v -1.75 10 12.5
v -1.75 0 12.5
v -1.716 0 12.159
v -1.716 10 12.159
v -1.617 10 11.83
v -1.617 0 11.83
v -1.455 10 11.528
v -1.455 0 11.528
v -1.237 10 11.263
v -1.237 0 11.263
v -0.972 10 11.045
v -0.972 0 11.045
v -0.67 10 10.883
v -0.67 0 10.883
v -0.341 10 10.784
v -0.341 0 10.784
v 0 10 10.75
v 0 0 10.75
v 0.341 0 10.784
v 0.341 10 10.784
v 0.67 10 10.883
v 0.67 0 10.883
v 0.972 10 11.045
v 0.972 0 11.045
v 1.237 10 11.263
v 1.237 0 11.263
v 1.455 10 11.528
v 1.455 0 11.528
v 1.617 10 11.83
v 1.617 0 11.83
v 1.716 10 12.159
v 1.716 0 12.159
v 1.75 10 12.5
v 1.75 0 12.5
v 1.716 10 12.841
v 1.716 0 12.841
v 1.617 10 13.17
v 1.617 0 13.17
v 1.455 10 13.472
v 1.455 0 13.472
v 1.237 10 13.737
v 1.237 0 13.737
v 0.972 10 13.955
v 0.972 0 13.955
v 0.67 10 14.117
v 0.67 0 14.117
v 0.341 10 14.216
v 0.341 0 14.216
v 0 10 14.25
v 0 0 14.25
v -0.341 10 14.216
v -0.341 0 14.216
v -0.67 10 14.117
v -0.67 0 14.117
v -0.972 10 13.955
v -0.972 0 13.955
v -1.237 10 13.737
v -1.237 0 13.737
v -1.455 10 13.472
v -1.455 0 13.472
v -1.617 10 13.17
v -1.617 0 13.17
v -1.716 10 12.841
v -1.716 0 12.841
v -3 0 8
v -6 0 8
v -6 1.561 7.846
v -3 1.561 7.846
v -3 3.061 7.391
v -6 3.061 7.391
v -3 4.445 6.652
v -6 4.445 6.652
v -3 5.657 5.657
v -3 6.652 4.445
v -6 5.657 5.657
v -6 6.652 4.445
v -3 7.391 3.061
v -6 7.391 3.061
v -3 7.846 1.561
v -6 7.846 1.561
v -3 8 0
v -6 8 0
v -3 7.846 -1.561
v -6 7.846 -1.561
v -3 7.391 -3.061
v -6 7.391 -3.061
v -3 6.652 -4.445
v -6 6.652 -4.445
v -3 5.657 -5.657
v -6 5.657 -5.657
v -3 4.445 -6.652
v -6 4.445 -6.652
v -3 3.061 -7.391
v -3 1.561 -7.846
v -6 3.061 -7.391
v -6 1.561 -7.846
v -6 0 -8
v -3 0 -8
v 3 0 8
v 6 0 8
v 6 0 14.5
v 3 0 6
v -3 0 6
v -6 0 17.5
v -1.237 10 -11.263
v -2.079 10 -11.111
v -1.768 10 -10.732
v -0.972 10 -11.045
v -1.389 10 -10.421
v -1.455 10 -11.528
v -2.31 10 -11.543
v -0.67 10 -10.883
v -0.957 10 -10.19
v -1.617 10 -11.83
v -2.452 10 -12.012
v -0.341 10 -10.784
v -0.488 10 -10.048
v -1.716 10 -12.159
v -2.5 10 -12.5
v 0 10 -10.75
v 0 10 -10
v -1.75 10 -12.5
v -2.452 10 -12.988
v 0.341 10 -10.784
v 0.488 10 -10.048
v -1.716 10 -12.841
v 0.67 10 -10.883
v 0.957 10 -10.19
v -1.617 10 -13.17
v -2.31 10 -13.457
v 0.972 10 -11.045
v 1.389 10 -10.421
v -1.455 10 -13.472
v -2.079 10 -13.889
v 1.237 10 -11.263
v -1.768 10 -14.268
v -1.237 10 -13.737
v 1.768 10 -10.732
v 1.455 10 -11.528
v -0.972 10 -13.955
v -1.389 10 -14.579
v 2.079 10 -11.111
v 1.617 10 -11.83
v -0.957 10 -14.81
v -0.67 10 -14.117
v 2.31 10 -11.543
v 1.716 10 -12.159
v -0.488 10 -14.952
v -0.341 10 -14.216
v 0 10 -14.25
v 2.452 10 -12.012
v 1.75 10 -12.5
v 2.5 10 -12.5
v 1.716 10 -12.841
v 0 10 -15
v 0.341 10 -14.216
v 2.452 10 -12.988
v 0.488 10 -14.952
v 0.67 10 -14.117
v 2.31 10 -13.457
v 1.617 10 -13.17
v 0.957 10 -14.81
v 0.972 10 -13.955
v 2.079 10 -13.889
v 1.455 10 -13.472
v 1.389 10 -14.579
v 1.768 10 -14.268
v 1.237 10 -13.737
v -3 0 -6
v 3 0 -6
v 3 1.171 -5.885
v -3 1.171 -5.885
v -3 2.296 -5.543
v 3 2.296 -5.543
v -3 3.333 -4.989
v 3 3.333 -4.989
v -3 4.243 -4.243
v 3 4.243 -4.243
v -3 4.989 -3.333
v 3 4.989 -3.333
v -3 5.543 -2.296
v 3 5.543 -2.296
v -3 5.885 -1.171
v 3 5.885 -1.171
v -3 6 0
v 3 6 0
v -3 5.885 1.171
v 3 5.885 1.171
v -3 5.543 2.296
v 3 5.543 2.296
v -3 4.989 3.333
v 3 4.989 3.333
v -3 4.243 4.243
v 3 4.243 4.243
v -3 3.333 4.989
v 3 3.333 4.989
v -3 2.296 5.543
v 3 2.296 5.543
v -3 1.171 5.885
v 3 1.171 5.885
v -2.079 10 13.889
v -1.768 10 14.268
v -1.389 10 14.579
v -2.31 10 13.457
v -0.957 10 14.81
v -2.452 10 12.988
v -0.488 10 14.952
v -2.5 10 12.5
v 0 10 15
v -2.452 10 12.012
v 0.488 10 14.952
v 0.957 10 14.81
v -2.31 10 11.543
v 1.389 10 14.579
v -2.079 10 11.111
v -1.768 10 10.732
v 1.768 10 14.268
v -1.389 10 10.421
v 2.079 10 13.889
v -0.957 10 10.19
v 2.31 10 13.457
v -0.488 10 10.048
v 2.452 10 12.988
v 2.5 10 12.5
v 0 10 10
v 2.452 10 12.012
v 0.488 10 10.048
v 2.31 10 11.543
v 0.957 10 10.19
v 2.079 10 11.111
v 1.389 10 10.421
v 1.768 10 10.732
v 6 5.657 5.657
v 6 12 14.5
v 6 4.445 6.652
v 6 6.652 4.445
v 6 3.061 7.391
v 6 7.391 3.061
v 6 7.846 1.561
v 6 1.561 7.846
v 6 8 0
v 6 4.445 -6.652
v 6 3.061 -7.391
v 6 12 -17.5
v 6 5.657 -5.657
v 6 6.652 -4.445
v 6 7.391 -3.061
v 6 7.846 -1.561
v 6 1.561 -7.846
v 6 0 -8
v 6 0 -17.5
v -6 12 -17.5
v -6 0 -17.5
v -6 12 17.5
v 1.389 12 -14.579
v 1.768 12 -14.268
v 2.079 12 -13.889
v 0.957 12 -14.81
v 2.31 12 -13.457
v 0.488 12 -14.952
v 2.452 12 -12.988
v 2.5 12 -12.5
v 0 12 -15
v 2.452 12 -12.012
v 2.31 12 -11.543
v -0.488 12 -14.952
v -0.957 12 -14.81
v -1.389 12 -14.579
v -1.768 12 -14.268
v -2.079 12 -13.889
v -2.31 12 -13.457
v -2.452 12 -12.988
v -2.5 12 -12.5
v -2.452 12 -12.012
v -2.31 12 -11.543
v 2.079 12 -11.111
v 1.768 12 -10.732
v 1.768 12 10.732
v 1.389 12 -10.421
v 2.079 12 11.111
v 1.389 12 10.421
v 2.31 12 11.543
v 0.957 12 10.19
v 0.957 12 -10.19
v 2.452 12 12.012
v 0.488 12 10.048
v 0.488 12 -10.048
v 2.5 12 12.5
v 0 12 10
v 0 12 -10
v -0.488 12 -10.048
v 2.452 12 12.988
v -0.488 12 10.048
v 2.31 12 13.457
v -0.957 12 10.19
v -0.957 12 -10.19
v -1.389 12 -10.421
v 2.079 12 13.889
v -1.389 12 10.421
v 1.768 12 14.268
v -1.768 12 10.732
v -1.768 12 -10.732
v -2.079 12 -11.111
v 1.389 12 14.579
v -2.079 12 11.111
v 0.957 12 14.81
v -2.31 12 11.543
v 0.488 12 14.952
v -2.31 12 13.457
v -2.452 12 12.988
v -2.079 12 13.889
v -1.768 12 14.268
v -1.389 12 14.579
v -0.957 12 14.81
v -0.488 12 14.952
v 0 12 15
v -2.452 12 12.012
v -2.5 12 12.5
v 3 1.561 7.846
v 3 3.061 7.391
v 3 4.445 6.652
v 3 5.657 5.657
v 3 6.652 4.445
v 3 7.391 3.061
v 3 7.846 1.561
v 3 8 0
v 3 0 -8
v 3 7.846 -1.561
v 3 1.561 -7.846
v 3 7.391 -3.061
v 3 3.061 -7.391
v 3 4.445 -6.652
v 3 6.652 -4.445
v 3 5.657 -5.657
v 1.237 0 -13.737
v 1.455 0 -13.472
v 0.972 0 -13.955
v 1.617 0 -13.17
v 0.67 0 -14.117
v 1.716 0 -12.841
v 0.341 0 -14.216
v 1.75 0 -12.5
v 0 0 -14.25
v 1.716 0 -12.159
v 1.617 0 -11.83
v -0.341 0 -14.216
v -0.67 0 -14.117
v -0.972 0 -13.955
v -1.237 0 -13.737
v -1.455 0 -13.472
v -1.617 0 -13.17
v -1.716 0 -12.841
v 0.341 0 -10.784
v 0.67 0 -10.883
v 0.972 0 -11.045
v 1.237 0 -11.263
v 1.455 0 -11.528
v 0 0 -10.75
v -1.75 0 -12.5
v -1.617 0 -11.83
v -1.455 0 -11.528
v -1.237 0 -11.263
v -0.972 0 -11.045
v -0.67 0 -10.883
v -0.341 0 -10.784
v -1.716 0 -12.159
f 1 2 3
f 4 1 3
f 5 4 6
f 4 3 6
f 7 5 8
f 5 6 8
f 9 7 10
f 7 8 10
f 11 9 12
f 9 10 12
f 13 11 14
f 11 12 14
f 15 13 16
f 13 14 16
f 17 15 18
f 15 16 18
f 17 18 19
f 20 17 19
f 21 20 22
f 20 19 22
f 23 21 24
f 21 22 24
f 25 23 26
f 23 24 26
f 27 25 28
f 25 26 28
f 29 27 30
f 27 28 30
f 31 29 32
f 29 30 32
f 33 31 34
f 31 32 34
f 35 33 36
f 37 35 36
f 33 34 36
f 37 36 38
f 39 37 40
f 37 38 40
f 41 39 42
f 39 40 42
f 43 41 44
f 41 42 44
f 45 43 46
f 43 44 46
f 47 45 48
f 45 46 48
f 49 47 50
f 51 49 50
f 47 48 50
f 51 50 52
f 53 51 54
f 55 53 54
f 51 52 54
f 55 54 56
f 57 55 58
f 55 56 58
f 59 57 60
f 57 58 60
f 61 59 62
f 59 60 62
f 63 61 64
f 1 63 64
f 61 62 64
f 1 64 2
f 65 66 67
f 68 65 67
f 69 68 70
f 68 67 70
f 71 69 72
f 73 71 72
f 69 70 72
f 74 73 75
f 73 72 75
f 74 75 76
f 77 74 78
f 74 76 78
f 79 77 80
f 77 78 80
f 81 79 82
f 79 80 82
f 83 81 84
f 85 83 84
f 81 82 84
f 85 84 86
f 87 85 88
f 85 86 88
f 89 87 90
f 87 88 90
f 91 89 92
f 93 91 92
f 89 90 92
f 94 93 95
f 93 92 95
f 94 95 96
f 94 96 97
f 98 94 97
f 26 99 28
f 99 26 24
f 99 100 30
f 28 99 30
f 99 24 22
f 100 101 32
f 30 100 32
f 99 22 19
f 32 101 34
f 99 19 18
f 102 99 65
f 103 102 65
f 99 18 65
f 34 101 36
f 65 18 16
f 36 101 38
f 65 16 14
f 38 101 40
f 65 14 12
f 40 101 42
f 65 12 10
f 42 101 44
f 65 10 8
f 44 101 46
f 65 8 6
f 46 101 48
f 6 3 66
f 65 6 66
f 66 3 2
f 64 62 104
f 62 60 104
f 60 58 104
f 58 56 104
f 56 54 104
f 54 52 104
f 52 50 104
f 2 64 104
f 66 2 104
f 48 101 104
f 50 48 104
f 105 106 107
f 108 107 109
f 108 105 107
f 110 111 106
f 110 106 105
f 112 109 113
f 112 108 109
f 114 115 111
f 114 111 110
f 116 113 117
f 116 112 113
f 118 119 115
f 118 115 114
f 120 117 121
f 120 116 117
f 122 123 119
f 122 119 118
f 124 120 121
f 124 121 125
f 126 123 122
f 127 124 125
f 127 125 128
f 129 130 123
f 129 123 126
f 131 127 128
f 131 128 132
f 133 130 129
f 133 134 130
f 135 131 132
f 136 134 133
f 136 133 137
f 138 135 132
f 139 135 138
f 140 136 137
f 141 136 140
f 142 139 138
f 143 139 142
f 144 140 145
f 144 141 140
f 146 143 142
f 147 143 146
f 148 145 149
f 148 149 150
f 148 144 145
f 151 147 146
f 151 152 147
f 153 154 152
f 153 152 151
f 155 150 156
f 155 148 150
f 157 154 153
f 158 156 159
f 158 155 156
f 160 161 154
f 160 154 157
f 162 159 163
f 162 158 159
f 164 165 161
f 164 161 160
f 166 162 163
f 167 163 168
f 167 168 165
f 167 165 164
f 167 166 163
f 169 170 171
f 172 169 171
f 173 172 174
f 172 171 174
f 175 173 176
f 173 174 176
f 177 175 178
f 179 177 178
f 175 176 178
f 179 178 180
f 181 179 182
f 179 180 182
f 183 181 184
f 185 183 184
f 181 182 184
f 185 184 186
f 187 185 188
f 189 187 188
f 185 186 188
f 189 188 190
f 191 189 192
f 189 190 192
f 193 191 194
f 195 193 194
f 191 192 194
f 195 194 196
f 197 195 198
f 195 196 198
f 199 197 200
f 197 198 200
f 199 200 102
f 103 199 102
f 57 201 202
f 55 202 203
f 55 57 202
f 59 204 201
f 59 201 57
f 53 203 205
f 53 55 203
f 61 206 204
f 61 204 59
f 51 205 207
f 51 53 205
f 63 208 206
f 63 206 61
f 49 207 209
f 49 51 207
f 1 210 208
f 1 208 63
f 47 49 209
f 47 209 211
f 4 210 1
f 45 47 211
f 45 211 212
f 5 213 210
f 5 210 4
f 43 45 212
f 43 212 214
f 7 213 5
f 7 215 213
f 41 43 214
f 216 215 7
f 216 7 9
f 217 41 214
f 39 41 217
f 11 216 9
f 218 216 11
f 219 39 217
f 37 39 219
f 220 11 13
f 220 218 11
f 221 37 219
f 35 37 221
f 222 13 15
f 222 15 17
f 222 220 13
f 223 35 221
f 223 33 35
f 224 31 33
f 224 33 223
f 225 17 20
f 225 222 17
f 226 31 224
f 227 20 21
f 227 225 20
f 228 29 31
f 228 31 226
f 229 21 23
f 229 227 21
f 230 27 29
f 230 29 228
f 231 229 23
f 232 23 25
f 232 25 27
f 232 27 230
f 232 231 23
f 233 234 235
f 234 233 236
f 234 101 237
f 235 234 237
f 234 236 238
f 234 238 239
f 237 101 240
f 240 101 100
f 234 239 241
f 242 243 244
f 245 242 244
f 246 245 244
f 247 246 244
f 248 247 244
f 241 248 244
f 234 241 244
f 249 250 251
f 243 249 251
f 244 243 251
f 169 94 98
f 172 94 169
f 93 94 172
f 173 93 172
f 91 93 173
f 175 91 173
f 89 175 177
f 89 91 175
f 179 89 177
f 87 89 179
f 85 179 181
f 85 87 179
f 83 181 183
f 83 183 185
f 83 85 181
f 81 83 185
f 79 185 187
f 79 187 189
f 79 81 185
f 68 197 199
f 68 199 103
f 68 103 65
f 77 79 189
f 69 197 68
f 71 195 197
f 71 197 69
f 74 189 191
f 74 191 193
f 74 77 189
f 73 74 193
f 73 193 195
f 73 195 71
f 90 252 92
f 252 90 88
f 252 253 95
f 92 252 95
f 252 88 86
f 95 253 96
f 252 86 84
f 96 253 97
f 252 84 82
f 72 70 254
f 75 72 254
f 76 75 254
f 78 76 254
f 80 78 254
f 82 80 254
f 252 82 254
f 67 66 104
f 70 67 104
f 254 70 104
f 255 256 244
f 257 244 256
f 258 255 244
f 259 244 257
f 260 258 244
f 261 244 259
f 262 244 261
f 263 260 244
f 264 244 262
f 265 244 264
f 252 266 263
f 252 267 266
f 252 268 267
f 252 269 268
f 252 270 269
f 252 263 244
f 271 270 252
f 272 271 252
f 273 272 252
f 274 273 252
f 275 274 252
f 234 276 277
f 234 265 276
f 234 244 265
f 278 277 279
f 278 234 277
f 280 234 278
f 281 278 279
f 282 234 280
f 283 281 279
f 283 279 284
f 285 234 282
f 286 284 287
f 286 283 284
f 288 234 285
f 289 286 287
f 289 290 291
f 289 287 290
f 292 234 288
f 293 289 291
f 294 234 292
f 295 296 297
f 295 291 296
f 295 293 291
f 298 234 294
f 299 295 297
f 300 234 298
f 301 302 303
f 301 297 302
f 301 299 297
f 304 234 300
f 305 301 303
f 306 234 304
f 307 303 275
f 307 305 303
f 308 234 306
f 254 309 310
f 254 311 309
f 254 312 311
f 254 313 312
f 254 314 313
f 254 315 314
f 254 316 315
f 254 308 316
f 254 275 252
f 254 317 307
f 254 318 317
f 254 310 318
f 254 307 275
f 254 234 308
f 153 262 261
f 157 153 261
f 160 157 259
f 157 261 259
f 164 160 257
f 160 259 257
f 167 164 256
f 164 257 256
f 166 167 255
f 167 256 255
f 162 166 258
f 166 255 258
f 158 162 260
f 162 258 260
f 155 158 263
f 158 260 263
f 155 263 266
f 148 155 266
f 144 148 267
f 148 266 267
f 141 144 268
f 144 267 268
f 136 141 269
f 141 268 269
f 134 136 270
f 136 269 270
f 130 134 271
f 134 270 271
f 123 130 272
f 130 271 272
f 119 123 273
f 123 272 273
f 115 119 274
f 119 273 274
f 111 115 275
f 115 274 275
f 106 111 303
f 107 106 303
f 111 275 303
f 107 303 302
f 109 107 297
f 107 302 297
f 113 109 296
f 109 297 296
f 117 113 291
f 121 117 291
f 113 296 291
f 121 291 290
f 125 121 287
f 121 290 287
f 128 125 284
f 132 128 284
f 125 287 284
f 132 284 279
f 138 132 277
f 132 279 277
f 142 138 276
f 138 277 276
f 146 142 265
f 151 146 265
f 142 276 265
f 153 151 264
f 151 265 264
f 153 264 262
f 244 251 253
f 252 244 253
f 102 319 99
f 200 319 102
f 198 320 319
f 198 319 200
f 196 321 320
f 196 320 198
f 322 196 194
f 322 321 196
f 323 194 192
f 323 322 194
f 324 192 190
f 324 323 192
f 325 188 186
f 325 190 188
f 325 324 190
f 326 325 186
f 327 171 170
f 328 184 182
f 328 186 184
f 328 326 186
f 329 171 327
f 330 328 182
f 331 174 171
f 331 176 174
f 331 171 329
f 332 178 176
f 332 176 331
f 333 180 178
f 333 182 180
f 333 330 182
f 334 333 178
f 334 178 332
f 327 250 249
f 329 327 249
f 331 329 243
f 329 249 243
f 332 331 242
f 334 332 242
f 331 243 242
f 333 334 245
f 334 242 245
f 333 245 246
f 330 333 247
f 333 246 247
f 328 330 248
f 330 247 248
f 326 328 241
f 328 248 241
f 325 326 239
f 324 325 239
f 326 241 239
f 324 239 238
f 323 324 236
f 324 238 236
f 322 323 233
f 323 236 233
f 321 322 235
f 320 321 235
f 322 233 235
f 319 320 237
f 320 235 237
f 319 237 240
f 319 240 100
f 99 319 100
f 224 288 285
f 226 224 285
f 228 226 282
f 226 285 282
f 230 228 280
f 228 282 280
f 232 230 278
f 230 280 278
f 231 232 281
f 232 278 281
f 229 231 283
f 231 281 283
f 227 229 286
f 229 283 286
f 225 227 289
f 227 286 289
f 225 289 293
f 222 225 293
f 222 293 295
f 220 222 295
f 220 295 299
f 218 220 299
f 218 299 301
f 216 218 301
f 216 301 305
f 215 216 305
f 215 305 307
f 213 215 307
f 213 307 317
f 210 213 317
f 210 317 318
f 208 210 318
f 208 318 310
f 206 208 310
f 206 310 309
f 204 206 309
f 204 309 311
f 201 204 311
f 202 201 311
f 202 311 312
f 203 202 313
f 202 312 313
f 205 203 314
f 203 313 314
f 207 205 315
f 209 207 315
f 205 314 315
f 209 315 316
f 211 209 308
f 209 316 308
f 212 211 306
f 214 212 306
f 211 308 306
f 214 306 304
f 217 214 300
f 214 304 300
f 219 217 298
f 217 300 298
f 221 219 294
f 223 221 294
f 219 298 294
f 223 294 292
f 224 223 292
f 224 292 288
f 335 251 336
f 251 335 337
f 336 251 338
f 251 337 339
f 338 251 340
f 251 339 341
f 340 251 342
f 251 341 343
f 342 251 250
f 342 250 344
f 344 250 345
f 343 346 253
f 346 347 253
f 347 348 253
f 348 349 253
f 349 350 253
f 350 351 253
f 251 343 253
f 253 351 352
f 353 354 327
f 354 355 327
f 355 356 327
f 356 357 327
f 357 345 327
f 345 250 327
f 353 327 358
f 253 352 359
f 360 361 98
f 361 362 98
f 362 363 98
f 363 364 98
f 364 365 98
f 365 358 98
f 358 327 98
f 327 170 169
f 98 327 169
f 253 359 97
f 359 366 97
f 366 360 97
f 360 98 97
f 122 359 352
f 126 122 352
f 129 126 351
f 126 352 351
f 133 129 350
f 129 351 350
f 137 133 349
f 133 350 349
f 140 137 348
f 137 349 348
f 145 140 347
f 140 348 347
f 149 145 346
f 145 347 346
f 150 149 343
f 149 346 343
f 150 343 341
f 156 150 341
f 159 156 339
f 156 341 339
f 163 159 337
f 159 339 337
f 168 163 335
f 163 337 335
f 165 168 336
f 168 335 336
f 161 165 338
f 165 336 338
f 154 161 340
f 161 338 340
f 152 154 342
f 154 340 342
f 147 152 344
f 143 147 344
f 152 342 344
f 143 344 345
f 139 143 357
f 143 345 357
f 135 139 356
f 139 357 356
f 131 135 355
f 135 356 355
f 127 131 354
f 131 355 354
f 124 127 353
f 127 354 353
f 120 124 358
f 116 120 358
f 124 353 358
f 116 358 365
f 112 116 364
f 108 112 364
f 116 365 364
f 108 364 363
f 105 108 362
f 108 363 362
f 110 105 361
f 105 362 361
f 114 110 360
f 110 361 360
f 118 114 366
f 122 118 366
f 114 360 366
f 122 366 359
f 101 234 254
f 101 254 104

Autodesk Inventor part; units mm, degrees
ref_plane "YZ Plane" through (0, 0, 0) normal (1, 0, 0) x (0, 1, 0)
ref_plane "XZ Plane" through (0, 0, 0) normal (0, 1, 0) x (-1, 0, 0)
ref_plane "XY Plane" through (0, 0, 0) normal (0, 0, 1) x (1, 0, 0)
sketch "Szkic1" plane through (0, 0, 0) normal (0, 1, 0) x (-1, 0, 0)
  line L0 (-6, -17.5) -> (6, -17.5)
  line L1 (6, -17.5) -> (6, 17.5)
  line L2 (6, 17.5) -> (-6, 17.5)
  line L3 (-6, 17.5) -> (-6, -17.5)
  line L4 (-6, -17.5) -> (6, 17.5) construction
  line L5 (6, -17.5) -> (-6, 17.5) construction
  circle A0 centre (0, 12.5) radius 1.75
  circle A1 centre (0, -12.5) radius 1.75
  point P0 (0, 0)
  dimension "d0" = 12
  dimension "d1" = 35
  dimension "d2" = 3.5
  dimension "d3" = 3.5
extrude "Wyciągnięcie proste1" add sketch "Szkic1" along normal blind 12
sketch "Szkic2" plane through (6, 0, 17.5) normal (1, 0, 0) x (0, 0, -1)
  arc A0 (25.5, 0) -> (9.5, 0) centre (17.5, 0) ccw
  line L0 (9.5, 0) -> (11.5, 0)
  line L1 (23.5, 0) -> (25.5, 0)
  arc A1 (23.5, 0) -> (11.5, 0) centre (17.5, 0) ccw
  dimension "d7" = 16
extrude "Wyciągnięcie proste2" cut sketch "Szkic2" against normal blind 3
sketch "Szkic3" plane through (6, 0, 6) normal (1, 0, 0) x (0, 0, -1)
  line L0 (0, 0) -> (12, 0)
  arc A0 (12, 0) -> (0, 0) centre (6, 0) ccw
extrude "Wyciągnięcie proste3" cut sketch "Szkic3" against normal blind 9
sketch "Szkic4" plane through (-6, 0, -17.5) normal (-1, 0, 0) x (0, 0, 1)
  arc A0 (25.5, 0) -> (9.5, 0) centre (17.5, 0) ccw
  line L0 (25.5, 0) -> (9.5, 0)
  dimension "d13" = 16
sketch "Szkic5" plane through (-6, 0, -17.5) normal (-1, 0, 0) x (0, 0, 1)
  point P0 (17.5, 0)
extrude "Wyciągnięcie proste4" cut sketch "Szkic4" against normal blind 3
sketch "Szkic6" plane through (0, 12, 0) normal (0, 1, 0) x (1, 0, 0)
  circle A0 centre (0, -12.5) radius 2.5
  circle A1 centre (0, 12.5) radius 2.5
  point P0 (0, 0)
  dimension "d16" = 5
  dimension "d17" = 5
extrude "Wyciągnięcie proste5" cut sketch "Szkic6" against normal blind 2
chamfer "Faza1" distance 12 distance2 3 1 edges at (6, 6, 17.5) measured on face at (-2, 4, 17.5)
properties part number "ExtruderClamp"
